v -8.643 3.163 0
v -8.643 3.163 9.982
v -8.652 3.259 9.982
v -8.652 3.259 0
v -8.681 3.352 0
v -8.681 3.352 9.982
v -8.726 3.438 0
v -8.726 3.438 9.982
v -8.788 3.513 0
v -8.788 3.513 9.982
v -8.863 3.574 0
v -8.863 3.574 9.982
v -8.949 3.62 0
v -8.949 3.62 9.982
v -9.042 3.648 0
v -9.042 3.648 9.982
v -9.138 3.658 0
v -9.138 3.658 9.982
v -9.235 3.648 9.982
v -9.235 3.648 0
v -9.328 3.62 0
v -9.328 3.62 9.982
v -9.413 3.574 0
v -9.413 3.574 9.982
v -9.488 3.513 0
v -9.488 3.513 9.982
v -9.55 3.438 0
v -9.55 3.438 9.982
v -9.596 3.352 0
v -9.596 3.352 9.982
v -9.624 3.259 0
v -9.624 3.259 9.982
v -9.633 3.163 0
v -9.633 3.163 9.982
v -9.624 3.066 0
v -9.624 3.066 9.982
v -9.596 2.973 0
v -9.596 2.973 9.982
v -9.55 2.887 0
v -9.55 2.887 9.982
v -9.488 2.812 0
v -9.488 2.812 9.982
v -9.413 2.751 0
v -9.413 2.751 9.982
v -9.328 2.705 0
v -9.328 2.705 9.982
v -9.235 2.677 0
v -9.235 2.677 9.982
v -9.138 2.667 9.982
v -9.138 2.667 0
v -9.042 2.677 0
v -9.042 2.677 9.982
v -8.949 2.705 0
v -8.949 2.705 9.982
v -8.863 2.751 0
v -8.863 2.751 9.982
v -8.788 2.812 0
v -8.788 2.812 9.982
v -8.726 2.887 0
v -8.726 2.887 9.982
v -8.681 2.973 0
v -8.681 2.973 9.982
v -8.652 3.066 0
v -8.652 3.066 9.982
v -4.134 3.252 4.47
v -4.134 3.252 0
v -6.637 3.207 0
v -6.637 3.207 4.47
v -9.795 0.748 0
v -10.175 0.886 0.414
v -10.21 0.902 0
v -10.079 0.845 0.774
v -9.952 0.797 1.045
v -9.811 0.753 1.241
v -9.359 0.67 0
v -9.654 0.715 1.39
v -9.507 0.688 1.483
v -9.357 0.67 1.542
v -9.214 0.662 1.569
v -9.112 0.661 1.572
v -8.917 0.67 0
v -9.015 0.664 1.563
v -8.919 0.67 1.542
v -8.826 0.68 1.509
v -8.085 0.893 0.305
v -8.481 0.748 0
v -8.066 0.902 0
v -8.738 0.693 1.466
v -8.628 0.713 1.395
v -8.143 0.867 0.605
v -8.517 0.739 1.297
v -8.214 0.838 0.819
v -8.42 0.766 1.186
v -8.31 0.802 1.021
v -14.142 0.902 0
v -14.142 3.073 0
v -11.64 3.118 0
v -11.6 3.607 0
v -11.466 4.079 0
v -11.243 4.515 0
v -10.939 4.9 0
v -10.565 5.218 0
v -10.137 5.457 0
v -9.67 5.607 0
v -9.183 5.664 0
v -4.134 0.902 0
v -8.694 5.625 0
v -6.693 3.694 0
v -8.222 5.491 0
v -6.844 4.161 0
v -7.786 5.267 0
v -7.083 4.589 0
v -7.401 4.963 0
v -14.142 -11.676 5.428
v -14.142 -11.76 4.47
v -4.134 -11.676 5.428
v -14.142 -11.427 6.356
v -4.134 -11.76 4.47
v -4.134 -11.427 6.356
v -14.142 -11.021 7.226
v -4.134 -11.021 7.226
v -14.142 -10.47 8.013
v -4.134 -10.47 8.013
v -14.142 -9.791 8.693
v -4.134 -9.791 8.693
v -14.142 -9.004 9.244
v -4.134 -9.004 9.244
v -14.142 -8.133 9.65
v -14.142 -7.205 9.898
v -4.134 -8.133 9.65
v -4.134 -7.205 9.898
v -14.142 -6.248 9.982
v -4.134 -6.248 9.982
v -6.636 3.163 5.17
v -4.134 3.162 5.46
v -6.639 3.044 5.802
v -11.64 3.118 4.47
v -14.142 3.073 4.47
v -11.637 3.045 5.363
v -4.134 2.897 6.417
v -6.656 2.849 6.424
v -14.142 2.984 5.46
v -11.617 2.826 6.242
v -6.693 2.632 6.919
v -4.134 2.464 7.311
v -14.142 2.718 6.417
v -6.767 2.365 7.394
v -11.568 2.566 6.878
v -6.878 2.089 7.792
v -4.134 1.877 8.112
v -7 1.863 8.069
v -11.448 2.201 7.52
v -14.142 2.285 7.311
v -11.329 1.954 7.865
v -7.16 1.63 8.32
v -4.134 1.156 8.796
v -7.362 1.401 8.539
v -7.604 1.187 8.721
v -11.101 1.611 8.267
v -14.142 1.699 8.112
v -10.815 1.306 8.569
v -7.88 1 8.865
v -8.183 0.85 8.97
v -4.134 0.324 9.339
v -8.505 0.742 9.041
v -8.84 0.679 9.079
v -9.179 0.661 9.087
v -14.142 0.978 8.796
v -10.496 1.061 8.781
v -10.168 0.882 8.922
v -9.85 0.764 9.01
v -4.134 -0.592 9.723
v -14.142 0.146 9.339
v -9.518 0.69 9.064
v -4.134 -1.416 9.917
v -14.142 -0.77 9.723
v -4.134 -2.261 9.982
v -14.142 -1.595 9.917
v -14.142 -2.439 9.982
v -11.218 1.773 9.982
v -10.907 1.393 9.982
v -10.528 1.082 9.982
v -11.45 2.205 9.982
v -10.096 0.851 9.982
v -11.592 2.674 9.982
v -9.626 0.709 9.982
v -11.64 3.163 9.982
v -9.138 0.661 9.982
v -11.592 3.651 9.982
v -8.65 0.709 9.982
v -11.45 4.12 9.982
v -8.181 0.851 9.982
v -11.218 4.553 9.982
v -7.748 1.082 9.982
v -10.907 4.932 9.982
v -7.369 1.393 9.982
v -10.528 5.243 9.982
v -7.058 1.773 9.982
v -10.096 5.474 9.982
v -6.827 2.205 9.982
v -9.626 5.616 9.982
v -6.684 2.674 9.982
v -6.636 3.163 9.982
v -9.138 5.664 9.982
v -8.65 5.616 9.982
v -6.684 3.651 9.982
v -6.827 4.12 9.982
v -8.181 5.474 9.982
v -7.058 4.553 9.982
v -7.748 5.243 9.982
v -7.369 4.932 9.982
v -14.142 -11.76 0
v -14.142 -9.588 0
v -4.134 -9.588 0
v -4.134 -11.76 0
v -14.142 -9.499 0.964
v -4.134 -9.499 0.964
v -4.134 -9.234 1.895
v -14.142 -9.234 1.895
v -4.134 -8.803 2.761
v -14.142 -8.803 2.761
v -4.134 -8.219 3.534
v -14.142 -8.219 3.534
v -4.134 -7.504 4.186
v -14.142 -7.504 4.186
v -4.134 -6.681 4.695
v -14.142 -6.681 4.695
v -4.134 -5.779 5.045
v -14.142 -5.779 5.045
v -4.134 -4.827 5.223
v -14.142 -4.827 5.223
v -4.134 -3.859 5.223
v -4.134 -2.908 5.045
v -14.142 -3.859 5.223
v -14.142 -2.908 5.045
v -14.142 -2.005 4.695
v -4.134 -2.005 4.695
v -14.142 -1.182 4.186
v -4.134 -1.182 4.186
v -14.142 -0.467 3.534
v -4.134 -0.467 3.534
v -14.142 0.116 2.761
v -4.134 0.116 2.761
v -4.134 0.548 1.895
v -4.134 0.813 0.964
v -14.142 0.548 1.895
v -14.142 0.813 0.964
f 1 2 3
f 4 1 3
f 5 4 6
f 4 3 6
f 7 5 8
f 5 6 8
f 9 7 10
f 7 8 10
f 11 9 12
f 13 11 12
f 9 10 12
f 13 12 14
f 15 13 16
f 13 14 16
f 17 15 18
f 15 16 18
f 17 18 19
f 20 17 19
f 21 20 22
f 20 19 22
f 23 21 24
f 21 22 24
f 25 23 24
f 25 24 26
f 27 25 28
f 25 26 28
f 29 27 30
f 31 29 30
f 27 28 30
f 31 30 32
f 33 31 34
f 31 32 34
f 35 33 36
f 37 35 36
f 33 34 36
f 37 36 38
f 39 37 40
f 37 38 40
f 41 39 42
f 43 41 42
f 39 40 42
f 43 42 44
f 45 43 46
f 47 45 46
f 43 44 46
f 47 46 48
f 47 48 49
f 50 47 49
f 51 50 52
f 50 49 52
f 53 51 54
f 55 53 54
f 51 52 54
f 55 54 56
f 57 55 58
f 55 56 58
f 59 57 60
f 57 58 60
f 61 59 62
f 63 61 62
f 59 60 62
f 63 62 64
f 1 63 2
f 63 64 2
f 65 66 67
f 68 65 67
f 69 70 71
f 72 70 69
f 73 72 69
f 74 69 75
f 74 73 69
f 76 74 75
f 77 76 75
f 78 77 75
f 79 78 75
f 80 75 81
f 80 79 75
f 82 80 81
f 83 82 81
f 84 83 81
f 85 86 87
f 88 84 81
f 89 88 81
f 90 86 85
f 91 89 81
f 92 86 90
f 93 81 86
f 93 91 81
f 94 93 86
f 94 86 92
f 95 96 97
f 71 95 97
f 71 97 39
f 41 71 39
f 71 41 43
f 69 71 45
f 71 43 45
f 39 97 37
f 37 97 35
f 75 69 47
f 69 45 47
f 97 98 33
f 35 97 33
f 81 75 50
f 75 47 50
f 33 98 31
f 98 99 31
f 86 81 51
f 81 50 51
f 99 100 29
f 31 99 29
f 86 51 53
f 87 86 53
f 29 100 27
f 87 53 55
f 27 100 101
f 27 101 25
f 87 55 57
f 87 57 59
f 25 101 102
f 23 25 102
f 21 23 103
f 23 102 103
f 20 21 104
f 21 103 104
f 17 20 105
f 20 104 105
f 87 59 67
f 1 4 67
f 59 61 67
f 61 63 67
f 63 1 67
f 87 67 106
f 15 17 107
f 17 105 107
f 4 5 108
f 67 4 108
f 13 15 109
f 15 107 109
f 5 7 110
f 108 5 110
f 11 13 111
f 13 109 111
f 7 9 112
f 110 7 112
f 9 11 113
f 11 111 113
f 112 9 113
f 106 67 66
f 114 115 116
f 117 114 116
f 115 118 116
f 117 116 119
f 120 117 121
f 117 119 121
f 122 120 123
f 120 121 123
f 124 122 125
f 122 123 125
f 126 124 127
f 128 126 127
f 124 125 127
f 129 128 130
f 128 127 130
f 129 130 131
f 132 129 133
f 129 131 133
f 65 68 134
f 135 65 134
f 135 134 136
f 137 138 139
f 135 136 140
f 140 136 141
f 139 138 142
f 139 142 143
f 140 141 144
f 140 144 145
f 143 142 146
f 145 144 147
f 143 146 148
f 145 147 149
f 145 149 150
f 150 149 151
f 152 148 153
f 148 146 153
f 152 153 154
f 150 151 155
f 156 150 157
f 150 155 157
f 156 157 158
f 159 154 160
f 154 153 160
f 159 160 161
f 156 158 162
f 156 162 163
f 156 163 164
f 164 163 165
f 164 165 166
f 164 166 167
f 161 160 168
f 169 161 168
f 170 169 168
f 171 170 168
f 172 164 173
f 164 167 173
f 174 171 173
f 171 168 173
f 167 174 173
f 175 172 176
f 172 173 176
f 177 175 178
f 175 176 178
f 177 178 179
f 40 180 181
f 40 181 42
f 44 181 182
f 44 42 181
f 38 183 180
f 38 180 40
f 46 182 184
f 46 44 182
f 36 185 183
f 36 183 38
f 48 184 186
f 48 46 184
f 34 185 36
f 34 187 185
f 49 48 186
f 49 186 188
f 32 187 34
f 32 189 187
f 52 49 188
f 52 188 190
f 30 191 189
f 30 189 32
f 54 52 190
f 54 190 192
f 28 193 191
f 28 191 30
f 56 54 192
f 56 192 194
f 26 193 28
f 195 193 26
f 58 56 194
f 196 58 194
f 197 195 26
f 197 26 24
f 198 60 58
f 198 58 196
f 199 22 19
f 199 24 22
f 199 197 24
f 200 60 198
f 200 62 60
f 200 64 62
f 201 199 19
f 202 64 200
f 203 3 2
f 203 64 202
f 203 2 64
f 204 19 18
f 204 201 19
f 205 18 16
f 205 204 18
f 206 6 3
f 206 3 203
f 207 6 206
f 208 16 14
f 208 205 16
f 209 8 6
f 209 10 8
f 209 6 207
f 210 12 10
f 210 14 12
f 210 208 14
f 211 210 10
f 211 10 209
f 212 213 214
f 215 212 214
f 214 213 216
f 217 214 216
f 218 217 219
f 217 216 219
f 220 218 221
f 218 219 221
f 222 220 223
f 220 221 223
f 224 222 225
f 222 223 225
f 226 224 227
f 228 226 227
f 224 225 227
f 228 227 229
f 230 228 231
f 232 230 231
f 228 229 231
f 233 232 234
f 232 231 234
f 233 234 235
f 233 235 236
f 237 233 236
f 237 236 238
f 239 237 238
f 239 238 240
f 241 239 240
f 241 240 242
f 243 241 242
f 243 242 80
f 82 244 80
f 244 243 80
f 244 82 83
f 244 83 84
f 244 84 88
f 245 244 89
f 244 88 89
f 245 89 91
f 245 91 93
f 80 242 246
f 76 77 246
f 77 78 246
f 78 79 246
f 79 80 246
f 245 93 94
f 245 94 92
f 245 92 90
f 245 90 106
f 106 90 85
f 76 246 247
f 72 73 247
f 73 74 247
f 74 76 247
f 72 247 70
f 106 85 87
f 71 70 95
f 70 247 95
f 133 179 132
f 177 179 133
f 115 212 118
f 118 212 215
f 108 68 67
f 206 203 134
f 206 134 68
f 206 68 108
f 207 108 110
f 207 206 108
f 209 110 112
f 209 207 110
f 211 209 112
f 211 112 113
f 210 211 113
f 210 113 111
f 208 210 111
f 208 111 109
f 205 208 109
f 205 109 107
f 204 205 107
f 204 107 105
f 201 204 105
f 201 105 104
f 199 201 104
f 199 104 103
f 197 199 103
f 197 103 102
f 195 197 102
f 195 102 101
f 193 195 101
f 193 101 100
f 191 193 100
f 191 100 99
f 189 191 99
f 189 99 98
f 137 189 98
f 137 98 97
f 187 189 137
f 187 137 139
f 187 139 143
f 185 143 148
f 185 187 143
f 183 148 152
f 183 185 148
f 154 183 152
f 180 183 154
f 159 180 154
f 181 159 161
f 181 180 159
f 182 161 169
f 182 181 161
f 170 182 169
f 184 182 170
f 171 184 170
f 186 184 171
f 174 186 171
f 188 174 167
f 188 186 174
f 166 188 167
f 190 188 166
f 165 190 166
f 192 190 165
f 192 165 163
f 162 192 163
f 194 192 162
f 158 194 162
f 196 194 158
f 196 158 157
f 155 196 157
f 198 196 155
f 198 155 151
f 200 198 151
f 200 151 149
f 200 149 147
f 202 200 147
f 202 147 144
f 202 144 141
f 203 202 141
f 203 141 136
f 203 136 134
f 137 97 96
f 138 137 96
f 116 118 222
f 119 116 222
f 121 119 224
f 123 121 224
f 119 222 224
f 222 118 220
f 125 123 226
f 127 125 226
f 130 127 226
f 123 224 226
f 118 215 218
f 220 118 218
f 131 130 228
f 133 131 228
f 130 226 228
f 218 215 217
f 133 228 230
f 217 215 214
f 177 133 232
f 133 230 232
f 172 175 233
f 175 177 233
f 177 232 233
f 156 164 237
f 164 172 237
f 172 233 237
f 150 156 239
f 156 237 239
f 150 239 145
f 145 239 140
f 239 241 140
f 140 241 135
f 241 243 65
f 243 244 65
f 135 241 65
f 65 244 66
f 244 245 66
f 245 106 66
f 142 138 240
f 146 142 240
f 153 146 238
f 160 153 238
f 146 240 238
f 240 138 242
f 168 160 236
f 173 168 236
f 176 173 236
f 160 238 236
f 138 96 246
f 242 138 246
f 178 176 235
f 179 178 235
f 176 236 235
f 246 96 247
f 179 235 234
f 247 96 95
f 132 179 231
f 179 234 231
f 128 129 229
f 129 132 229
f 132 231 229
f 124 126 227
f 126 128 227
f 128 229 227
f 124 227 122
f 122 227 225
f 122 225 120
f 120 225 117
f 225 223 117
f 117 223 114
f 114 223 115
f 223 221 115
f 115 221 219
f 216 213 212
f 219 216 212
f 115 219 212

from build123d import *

# Parameters (mm, degrees)
F1_DEPTH  = 7.493
F3_DEPTH  = 10.0086
F5_DEPTH  = 2.4892
F6_R      = 5.5118
F7_R      = 2.5019
F8_DEPTH  = 9.9822
F9_R      = 0.4953
F10_DEPTH = 9.9822


with BuildPart() as f1:
    # F0 (on Top) → F1 (new body)
    with BuildSketch(Plane.XY):
        Polygon((-14.141997, 3.073401), (-14.141997, -11.759634), (-4.134397, -11.759634), (-4.134397, 3.251766), align=None)
    extrude(amount=F1_DEPTH)

    # F2 (on face) → F3 (cut, through all)
    with BuildSketch(Plane(origin=(-14.141997, 0, 0), x_dir=(0, -1, 0), z_dir=(-1, 0, 0))):
        with BuildLine():
            Line((-0.901983, 0), (9.588217, 0))
            ThreePointArc((9.588217, 0), (4.343117, 5.2451), (-0.901983, 0))
        make_face()
    extrude(amount=-F3_DEPTH, mode=Mode.SUBTRACT)

    # F4 (on face) → F5 (join)
    with BuildSketch(Plane.XY.offset(7.493)):
        Polygon((-4.134397, 3.251766), (-14.141997, 3.073401), (-14.141997, -11.759634), (-4.134397, -11.759634), align=None)
    extrude(amount=F5_DEPTH)

    # F6
    f6_edges = [f1.edges().sort_by_distance(p)[0] for p in [
        (-9.138197, 3.162583, 9.9822),
        (-9.138197, -11.759634, 9.9822),
    ]]
    fillet(f6_edges, radius=F6_R)

    # F7 (on face) → F8 (join)
    with BuildSketch(Plane.XY.offset(9.9822)):
        with Locations((-9.138197, 3.162583)):
            Circle(F7_R)
    extrude(amount=-F8_DEPTH)

    # F9 (on face) → F10 (cut)
    with BuildSketch(Plane.XY.offset(9.9822)):
        with Locations((-9.138197, 3.162583)):
            Circle(F9_R)
    extrude(amount=-F10_DEPTH, mode=Mode.SUBTRACT)


solid = f1.part
